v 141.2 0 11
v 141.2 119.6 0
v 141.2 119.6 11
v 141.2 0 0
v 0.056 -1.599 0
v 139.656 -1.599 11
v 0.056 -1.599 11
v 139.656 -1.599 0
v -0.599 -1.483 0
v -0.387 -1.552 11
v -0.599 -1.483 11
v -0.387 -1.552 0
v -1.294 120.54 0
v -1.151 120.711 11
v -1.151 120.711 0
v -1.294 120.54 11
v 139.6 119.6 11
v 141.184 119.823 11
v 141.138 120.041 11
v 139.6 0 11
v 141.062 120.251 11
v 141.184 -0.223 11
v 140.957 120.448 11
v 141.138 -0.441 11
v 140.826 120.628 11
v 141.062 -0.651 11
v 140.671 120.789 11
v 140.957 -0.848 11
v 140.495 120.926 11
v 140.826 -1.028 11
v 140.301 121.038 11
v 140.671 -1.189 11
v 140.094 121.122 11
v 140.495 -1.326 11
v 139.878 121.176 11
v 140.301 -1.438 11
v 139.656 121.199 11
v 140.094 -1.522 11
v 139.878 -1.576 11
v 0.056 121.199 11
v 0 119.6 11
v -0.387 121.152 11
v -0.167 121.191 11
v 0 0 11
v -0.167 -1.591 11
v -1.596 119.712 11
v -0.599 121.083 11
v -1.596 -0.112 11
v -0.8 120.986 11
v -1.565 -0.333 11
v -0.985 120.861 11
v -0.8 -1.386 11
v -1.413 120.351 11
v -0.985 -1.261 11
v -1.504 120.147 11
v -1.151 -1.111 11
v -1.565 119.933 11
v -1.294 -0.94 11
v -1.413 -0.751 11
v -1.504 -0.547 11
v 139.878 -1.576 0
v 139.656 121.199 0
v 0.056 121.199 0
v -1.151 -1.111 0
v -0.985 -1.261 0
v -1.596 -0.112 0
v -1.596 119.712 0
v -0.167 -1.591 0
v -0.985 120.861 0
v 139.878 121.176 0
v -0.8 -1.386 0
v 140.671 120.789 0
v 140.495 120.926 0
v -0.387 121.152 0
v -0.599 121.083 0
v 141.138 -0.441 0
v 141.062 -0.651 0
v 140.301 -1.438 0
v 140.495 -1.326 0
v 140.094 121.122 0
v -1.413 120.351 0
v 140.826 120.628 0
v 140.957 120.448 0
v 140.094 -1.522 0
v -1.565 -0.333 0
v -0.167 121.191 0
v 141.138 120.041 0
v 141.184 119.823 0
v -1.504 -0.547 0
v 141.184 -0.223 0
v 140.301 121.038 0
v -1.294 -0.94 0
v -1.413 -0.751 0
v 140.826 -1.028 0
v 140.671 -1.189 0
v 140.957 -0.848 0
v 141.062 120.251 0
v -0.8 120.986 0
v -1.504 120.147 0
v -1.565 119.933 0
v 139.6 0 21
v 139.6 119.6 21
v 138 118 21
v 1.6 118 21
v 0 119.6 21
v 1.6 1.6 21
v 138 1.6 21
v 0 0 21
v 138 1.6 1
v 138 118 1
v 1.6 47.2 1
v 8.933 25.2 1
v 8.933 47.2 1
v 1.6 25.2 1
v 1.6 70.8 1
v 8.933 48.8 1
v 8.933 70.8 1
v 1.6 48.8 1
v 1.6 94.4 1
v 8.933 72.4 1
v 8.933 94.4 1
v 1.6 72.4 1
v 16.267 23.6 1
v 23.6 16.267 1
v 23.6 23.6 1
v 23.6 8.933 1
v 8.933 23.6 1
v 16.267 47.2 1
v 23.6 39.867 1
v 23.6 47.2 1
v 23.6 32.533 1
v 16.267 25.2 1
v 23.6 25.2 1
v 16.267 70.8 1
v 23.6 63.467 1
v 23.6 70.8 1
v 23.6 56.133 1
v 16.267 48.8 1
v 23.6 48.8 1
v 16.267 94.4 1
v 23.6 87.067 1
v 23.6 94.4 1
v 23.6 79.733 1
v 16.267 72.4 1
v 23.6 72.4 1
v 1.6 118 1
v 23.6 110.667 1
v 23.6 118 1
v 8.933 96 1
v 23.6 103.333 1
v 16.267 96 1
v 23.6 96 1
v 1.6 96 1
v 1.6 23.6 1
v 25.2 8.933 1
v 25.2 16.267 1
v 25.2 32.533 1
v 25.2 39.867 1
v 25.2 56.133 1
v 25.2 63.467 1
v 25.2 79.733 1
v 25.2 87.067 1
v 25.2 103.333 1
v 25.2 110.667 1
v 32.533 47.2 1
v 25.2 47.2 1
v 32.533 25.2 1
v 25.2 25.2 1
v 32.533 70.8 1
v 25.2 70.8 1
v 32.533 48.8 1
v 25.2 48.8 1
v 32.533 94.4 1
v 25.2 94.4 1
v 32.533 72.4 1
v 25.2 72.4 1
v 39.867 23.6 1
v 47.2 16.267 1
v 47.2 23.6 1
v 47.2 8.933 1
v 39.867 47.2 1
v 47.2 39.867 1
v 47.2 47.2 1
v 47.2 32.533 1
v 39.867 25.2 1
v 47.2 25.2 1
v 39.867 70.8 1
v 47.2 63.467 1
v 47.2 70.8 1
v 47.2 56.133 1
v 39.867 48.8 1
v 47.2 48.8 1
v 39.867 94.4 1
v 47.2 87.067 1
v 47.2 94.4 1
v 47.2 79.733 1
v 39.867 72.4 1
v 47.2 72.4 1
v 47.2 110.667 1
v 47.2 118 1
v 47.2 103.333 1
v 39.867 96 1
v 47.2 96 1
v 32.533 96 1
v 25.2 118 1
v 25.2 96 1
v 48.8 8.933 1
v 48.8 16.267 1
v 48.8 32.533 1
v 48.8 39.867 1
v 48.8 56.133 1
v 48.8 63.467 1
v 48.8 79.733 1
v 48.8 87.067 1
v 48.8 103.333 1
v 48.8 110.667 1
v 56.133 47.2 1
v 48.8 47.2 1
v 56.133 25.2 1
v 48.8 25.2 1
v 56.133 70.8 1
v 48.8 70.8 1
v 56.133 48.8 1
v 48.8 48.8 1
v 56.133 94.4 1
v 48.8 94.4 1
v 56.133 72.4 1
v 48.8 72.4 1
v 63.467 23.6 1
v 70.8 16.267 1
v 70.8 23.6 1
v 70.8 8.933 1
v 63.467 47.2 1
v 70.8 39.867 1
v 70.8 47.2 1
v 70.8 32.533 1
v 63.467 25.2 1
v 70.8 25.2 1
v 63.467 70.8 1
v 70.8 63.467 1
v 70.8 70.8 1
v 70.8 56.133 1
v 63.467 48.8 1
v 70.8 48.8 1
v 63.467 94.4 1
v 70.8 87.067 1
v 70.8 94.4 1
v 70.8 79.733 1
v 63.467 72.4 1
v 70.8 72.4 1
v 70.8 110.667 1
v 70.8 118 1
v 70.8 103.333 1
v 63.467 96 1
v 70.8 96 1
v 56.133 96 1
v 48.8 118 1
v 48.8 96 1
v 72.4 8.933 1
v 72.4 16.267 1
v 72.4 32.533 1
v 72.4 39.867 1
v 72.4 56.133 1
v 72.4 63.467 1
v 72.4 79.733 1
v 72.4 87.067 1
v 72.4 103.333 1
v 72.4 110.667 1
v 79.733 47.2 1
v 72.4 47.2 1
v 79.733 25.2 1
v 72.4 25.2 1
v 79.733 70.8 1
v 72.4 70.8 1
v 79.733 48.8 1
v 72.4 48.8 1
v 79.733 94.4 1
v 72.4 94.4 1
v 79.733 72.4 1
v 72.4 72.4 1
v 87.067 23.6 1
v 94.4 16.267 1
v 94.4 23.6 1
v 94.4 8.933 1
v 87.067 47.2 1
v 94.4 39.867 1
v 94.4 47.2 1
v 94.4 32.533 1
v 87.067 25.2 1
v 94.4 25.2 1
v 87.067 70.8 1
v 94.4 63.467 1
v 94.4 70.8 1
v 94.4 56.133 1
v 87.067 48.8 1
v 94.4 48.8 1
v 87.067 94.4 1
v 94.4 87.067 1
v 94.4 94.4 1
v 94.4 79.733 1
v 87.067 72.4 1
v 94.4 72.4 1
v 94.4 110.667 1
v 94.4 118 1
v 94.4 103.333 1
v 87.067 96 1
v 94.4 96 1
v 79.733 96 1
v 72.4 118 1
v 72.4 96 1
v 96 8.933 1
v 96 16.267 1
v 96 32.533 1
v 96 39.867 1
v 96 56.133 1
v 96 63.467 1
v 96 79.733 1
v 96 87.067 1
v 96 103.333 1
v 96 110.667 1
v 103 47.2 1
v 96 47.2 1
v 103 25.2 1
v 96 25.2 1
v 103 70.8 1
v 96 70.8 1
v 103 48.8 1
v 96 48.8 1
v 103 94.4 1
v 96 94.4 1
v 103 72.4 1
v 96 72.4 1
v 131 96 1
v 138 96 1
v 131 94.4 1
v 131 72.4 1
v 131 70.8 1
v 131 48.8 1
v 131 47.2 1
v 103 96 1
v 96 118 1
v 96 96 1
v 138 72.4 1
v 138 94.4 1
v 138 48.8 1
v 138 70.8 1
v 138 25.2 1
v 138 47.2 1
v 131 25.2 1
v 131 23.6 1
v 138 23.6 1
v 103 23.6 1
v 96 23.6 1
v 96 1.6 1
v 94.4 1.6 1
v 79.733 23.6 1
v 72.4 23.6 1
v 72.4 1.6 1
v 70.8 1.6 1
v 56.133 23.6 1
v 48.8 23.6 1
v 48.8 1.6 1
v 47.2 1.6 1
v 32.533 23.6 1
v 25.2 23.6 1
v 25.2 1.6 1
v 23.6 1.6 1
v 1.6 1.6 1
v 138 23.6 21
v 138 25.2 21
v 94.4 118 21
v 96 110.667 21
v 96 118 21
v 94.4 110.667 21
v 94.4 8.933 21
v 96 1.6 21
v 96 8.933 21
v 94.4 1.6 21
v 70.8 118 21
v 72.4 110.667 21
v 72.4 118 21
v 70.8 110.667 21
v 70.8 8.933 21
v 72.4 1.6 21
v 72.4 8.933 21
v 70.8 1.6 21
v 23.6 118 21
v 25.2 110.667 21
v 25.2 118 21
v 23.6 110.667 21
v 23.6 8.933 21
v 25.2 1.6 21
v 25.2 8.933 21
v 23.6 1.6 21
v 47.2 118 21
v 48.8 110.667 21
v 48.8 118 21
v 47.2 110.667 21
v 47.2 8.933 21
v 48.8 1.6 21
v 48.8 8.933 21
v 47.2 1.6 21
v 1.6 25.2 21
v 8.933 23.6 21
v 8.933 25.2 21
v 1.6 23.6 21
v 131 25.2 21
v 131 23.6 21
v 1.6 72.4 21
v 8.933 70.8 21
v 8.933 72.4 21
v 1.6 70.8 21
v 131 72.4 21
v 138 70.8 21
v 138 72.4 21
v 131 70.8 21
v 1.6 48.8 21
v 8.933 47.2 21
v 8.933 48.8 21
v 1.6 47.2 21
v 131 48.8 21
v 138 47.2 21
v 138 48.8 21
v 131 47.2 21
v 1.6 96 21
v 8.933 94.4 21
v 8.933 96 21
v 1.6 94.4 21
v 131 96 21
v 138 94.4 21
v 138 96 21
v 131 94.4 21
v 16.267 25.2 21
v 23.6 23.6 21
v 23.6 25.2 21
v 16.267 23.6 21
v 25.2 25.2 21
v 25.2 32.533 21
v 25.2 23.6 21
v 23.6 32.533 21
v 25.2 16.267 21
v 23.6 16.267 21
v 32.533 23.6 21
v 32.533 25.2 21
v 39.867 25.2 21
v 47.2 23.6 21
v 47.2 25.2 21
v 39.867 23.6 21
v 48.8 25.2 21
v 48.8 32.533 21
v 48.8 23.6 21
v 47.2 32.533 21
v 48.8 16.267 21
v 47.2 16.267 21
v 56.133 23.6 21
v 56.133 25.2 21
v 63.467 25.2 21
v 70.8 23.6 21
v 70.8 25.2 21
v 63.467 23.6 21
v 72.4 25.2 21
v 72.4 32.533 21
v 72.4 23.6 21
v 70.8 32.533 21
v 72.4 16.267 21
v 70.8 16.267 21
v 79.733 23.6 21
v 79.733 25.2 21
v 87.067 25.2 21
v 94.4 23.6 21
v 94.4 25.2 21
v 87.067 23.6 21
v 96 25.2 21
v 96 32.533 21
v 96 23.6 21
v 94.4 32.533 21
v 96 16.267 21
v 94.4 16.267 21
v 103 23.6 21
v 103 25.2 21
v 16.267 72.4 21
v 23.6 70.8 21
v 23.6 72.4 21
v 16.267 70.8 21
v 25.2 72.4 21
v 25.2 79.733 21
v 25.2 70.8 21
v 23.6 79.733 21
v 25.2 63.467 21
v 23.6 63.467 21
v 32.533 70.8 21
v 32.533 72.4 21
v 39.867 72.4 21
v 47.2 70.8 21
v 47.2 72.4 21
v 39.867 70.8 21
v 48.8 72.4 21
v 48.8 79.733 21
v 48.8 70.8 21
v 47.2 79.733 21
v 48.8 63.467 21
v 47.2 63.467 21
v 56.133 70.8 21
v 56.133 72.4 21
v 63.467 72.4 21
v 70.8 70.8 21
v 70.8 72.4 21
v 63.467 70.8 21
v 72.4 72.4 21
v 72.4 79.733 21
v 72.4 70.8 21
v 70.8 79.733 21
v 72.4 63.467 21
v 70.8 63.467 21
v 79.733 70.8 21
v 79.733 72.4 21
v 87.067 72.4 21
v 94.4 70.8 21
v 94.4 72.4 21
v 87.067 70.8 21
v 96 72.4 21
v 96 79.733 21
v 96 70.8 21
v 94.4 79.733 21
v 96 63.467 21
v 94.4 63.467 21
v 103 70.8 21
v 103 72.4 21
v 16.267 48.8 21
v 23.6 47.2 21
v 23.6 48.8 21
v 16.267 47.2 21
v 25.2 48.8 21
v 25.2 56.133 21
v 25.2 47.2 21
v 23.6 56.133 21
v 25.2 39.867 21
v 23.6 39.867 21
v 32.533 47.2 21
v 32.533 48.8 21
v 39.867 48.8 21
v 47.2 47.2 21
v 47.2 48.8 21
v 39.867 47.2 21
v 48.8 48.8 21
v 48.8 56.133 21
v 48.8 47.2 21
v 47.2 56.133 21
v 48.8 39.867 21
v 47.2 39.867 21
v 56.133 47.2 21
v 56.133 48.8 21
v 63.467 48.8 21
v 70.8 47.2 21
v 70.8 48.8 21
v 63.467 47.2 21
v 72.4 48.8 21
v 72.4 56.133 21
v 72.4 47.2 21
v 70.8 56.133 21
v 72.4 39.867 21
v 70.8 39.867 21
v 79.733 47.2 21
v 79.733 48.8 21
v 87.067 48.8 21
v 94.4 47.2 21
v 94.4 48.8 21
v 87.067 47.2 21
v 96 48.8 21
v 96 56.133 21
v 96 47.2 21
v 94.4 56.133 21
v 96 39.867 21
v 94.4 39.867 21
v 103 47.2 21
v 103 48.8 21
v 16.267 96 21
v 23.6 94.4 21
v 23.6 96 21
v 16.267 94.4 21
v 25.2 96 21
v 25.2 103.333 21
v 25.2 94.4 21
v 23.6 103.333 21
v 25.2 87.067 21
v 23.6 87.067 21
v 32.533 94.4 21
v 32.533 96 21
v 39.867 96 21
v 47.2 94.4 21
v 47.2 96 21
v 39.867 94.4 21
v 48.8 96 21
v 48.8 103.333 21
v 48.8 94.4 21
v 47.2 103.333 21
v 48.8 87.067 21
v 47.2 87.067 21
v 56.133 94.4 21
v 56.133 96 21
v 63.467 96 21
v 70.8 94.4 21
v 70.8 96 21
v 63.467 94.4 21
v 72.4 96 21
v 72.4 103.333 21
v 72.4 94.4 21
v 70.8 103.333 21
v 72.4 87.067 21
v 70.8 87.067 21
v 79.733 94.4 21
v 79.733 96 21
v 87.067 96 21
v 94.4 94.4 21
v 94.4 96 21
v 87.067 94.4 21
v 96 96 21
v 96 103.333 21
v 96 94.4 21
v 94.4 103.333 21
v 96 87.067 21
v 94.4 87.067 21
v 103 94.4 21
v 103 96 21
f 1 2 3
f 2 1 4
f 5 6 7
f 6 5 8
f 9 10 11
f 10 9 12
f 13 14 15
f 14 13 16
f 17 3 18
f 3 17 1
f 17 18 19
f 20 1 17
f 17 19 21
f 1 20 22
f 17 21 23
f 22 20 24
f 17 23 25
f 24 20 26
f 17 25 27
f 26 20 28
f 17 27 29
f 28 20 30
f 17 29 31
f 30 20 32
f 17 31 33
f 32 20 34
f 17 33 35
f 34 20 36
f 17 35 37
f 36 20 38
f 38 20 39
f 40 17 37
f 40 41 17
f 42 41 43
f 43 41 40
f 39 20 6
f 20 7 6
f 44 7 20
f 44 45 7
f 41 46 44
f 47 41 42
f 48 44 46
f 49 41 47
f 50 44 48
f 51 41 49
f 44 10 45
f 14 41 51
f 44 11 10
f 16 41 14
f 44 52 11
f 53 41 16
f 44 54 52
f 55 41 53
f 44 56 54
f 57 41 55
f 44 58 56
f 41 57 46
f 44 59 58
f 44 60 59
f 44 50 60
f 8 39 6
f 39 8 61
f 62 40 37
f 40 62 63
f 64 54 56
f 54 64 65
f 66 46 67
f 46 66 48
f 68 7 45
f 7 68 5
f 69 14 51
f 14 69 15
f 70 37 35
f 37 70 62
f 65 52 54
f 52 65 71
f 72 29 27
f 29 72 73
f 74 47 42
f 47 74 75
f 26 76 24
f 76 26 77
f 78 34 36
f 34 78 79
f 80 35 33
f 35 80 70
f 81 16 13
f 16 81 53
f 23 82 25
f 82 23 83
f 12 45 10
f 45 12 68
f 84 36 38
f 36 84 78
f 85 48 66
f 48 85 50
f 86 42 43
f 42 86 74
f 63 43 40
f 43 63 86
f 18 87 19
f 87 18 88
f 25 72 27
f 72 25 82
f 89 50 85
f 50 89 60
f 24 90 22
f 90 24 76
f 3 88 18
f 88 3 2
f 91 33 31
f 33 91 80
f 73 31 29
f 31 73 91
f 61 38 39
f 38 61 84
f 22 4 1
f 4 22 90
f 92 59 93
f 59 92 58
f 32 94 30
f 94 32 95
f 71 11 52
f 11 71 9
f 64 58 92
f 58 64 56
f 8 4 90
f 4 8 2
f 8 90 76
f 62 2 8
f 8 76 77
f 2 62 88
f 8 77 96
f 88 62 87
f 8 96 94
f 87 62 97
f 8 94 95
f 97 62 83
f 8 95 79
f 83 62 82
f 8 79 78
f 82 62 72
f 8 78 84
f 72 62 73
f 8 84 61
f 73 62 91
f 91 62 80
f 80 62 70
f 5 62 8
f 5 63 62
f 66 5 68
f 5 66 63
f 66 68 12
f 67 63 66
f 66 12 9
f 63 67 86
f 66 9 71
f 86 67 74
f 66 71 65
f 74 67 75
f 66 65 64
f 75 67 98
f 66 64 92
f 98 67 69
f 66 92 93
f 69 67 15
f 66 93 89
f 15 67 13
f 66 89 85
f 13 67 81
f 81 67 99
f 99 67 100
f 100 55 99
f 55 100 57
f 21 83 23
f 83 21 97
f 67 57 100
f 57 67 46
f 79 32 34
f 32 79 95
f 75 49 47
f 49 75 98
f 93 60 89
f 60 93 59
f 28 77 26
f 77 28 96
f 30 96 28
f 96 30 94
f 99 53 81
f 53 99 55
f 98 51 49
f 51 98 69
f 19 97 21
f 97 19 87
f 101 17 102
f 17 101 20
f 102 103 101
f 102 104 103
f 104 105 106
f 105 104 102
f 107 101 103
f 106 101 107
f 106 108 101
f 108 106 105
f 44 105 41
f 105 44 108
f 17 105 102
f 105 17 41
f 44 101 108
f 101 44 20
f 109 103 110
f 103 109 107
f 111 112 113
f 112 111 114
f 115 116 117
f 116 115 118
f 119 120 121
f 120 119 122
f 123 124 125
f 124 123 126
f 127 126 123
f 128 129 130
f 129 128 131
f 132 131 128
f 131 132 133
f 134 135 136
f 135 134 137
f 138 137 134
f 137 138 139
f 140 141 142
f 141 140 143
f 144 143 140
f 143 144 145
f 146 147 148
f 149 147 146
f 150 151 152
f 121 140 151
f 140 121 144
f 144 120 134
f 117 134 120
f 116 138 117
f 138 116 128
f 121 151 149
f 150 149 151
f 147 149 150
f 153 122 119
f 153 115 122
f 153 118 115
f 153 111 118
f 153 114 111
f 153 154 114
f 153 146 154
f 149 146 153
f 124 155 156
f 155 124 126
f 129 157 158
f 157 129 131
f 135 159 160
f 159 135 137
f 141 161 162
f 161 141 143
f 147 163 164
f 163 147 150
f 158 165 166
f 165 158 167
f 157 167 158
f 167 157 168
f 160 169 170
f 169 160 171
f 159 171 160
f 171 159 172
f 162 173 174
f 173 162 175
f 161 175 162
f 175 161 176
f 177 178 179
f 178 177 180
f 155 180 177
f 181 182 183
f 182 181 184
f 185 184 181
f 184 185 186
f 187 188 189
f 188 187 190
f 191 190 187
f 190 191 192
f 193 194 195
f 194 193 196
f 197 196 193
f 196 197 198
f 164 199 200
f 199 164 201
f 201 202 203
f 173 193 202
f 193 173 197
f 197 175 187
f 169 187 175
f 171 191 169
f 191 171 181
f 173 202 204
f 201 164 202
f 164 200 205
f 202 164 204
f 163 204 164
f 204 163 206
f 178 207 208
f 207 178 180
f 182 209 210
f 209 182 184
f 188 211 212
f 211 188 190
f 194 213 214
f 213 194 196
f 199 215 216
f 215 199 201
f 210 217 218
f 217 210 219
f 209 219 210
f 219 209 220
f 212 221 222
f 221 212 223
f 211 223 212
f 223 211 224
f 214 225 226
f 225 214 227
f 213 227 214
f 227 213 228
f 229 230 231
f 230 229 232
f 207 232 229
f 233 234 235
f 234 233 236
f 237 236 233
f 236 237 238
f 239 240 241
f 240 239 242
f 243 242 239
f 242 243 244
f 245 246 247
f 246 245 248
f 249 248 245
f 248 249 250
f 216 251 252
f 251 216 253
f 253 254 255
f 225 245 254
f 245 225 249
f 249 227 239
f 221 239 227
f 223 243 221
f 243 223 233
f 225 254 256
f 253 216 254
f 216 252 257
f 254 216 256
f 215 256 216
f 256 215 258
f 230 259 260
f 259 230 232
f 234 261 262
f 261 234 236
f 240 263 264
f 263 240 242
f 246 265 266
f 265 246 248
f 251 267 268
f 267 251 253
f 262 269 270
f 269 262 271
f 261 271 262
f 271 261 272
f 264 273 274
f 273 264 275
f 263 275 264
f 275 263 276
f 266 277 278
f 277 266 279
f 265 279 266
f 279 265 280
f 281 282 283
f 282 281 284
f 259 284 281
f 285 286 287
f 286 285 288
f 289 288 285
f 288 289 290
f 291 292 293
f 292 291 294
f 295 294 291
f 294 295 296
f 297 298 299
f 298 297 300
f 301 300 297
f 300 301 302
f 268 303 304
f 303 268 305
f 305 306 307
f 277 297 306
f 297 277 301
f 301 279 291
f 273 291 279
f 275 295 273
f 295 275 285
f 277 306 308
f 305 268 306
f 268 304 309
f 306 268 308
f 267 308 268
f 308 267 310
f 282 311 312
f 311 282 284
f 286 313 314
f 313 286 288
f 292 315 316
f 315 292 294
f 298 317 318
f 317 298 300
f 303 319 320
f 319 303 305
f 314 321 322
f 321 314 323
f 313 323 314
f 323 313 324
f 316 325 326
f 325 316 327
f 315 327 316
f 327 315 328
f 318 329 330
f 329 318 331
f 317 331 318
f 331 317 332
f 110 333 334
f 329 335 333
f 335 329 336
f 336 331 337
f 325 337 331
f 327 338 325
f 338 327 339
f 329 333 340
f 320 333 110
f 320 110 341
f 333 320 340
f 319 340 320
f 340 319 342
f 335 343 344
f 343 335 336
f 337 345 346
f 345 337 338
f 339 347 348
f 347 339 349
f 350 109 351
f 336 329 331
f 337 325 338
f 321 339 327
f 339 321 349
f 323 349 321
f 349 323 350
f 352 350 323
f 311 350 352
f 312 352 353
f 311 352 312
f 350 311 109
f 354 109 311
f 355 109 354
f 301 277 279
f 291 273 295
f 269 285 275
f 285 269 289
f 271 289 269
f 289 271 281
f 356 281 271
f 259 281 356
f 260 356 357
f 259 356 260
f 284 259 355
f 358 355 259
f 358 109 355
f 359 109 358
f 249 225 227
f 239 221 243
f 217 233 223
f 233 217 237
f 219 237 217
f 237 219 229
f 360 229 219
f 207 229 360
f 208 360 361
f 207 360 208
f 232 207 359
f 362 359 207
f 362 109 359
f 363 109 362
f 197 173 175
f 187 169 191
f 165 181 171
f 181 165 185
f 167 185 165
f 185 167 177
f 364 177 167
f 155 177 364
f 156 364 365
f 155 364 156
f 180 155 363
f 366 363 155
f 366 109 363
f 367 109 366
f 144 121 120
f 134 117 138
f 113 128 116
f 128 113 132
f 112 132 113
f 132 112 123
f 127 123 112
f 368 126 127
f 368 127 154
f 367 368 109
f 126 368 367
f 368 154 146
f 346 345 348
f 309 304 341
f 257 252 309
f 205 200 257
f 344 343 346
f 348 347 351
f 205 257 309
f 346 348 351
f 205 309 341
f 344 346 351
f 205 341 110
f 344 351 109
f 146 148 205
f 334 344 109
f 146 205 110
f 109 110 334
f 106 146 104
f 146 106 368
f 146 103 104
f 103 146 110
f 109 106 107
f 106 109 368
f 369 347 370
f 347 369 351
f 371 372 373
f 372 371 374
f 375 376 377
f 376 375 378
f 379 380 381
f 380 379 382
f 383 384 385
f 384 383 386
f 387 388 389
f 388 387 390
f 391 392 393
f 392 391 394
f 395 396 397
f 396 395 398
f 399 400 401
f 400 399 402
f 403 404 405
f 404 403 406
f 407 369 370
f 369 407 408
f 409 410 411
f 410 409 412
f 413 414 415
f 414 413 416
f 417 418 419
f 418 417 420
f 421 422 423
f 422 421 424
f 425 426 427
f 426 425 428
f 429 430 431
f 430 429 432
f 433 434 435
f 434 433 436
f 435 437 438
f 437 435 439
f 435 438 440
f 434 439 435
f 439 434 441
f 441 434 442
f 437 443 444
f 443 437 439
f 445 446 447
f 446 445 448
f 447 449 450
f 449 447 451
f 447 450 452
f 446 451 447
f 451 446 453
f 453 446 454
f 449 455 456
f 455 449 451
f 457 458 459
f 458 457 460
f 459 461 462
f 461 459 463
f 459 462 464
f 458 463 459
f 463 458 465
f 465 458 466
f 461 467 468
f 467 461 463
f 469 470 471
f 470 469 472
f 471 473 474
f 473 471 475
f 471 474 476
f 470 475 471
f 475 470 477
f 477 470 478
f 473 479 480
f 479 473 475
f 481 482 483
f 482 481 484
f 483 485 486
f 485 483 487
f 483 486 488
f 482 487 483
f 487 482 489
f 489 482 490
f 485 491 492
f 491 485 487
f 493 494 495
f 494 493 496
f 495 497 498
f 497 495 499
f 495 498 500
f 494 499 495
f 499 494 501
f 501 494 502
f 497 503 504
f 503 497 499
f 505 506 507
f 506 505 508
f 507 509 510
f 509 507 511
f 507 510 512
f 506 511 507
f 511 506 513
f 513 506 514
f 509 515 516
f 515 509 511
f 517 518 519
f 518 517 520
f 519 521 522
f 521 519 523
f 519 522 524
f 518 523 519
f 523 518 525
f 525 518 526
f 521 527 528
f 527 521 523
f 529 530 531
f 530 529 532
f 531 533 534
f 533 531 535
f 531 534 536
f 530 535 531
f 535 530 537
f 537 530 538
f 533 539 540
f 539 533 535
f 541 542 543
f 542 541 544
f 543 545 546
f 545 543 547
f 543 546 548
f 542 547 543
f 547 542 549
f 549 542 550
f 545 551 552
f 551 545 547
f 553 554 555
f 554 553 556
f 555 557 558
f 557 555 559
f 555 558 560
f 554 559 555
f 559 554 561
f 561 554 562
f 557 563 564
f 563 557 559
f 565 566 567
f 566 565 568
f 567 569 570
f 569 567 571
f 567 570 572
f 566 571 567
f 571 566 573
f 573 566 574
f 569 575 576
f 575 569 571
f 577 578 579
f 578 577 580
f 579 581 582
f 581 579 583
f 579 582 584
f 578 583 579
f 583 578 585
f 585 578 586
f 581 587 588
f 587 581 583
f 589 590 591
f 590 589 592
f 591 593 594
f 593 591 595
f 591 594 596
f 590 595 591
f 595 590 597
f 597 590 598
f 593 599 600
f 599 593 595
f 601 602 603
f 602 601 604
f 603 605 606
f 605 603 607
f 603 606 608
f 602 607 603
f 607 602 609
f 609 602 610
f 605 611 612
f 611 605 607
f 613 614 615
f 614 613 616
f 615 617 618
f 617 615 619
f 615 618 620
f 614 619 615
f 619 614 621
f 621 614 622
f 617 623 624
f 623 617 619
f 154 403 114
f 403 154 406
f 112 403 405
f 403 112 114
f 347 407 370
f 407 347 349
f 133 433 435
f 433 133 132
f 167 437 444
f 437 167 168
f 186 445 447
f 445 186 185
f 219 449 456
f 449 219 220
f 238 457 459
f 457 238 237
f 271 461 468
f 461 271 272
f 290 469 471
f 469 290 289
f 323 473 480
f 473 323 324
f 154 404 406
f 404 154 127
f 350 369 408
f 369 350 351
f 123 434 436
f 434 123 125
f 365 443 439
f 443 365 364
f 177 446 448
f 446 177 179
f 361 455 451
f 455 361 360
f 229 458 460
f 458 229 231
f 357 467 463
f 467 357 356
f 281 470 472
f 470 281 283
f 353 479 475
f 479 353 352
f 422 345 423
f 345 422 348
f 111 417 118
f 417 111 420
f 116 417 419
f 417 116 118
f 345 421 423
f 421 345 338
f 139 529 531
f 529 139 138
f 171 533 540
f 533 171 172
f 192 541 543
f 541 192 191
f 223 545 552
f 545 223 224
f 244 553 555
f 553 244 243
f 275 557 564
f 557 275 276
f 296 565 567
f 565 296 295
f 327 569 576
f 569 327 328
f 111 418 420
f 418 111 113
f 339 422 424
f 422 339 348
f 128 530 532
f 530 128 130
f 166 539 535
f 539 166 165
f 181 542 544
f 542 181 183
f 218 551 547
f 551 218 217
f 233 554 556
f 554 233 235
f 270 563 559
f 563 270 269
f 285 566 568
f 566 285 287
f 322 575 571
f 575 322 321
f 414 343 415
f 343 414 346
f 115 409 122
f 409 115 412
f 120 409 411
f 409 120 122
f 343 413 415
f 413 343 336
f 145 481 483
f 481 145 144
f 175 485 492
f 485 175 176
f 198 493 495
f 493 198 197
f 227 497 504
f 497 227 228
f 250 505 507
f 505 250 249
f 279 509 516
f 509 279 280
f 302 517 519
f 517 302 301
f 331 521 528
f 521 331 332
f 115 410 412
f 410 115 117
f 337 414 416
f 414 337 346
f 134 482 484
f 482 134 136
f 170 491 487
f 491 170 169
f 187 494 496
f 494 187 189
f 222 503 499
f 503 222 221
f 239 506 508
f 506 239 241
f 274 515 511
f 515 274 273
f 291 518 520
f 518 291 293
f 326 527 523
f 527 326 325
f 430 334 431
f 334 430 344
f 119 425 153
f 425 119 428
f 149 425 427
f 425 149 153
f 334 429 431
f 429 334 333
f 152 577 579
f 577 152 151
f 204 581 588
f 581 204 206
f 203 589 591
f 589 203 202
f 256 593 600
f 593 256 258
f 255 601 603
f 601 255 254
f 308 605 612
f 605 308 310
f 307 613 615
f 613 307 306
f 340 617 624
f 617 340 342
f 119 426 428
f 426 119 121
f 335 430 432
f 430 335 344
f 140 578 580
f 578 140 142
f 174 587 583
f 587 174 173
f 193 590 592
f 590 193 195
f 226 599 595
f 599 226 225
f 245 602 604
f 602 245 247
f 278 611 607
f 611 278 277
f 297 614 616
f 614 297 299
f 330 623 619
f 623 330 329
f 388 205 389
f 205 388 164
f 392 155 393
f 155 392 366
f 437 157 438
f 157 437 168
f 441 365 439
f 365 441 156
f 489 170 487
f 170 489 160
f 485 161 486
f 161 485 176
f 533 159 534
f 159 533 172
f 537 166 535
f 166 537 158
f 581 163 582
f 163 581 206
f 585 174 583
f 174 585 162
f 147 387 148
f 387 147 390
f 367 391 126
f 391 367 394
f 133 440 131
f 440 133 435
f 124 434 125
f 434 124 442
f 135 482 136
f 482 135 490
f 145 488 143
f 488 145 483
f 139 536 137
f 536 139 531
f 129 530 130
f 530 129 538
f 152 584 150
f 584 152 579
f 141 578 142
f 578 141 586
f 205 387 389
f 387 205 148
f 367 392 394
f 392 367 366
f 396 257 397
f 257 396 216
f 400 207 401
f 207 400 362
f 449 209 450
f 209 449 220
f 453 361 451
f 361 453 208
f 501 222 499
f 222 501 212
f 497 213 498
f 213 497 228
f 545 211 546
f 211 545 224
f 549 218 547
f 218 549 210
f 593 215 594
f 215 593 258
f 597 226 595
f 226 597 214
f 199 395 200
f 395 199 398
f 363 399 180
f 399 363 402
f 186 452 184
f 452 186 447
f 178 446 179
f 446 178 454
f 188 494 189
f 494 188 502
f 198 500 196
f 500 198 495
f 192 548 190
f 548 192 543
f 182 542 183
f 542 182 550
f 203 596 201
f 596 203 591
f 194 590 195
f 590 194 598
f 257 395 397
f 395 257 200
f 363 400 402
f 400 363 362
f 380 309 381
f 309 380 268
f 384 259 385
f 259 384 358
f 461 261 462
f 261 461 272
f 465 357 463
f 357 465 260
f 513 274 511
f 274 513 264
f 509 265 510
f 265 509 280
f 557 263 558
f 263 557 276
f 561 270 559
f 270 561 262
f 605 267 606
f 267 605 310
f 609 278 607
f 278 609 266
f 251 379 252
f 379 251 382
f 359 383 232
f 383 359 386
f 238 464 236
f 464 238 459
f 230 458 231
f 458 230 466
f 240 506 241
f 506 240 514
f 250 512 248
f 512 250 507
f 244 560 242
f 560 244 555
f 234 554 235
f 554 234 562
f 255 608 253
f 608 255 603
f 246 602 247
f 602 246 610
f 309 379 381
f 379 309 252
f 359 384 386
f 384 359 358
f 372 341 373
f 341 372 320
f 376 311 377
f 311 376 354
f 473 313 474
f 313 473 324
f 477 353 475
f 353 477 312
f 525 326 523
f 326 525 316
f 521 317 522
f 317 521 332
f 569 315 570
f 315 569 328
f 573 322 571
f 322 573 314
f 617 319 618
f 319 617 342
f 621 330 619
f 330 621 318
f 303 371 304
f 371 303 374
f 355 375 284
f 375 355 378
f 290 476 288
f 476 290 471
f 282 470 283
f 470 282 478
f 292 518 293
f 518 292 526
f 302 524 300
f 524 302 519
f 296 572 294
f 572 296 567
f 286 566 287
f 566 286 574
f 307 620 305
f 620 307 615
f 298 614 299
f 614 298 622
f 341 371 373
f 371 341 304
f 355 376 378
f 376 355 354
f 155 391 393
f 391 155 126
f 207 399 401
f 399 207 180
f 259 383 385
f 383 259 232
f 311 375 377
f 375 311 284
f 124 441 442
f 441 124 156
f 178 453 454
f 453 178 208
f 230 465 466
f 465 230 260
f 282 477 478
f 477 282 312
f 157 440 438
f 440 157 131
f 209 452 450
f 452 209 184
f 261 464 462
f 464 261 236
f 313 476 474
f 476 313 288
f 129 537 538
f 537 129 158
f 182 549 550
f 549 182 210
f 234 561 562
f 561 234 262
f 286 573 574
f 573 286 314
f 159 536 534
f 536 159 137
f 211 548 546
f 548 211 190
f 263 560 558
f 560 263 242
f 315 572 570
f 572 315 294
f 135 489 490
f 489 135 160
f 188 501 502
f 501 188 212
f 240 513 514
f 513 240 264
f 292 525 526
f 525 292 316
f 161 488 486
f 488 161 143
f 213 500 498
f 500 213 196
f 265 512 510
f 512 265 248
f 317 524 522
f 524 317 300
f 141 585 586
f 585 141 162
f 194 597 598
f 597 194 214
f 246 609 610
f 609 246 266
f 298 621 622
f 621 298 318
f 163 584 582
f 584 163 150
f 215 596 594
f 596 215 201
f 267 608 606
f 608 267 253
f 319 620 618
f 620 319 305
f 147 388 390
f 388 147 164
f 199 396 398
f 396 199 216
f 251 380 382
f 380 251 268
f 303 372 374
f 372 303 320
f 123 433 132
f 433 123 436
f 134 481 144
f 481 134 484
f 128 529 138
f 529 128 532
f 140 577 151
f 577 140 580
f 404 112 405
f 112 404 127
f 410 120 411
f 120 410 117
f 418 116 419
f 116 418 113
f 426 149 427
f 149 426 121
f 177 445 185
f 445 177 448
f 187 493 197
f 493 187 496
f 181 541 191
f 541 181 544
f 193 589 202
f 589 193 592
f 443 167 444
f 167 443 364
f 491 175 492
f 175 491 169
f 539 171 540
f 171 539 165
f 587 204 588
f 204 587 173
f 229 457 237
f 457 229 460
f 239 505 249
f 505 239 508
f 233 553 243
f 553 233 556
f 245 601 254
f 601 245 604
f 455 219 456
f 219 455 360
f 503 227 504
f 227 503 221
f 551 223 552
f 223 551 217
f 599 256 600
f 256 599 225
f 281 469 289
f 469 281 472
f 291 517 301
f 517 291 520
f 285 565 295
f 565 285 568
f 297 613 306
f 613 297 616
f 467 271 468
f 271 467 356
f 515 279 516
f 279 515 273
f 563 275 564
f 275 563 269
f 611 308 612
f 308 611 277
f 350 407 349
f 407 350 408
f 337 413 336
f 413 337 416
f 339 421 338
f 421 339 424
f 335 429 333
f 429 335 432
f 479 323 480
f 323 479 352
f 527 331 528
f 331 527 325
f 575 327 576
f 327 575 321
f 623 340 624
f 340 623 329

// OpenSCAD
// Outpost 20th Anniversary Edition
//
// by W. Craig Trader is dual-licensed under 
// Creative Commons Attribution-ShareAlike 3.0 Unported License and
// GNU Lesser GPL 3.0 or later.

include <MCAD/units.scad>;

// Tile dimensions
TILE_THICKNESS = 2 * mm;
TILE_WIDTH = 20 * mm;
SMALL_TILE_HEIGHT = 20 * mm;
LARGE_TILE_HEIGHT = 40 * mm;
TILE_COUNT = max( 6, 9, 10 );

// Physical dimensions
WALL = 0.8 * mm;  // Slicing filament thickness
GAP  = 0.2 * mm;  // Size differential between box and lid, for snug fit
SPACING = 2 * mm; // Space around tiles to make them easier to insert / extract
LID = 1 * mm;
BOTTOM = 1 * mm;

// Wall dimensions
OUTER = 2 * WALL;
INNER = 2 * WALL;

// Command Line Arguments
PART = 1;           // Which part to output
VERBOSE = 1;        // Set to non-zero to see more data

OVERLAP = 0.1 * mm; // Ensures that there are no vertical artifacts leftover

$fn=45;

/*
 * Module / Function arguments:
 *
 * tiles    Number of tiles to stack vertically
 * rows     Number of rows of tiles
 * smalls   Number of small tiles per row
 * larges   Number of large tiles per row
 * extras   Size of extra storage bin (mm) per row
 * notches  True (default) to cut notches in the inside tile walls.
 */

tw = TILE_WIDTH + SPACING;
sth = SMALL_TILE_HEIGHT + SPACING;
lth = LARGE_TILE_HEIGHT + SPACING;
    
function inside_length( smalls, larges, extras ) = extras + smalls * sth + larges * lth + (sign(extras)+smalls-1+larges) * INNER;
function inside_depth( rows ) = rows * tw + (rows-1) * INNER;
function inside_height( tiles ) = tiles * TILE_THICKNESS;

module box_dividers(tiles, rows, smalls, larges, extras=40, notched=true) {
    row_x = inside_length( smalls, larges, extras );
    col_y = inside_depth( rows );
    div_z = inside_height( tiles );
    
    if (VERBOSE) {
        echo (InsideLength=row_x, InsideDepth=col_y, InsideHeight=div_z);
    }

    row_cuts   = [ [0,1*tw/3], [0,2*tw/3],  [div_z+OVERLAP,2*tw/3],  [div_z+OVERLAP,1*tw/3] ];
    small_cuts = [ [0,1*sth/3], [0,2*sth/3], [div_z+OVERLAP,2*sth/3], [div_z+OVERLAP,1*sth/3] ];
    large_cuts = [ [0,1*lth/6], [0,5*lth/6], [div_z+OVERLAP,5*lth/6], [div_z+OVERLAP,1*lth/6] ];

    difference() {
        union() {
            // Row walls
            for (row = [1:rows-1]) {
                dy = row * tw + (row-1) * INNER;
                translate( [0,dy,0] ) cube( [row_x, INNER, div_z ] );
            }
            
            // Extra compartments
            if (extras > 0) {
                dx = extras;
                translate( [dx,0,0] ) cube( [INNER, col_y, div_z] );
            }
            
            // Small column walls
            for (col = [1:smalls-1]) {
                dx = extras + sign(extras) * INNER + col * (tw + INNER) - INNER;
                translate( [dx,0,0] ) cube( [INNER, col_y, div_z] );
            }
            
            // Large column walls
            for (col = [0:larges-1]) {
                dx = extras + sign(extras) * INNER + smalls * (sth + INNER) + col * (lth + INNER) - INNER;
                translate( [dx,0,0] ) cube( [INNER, col_y, div_z] );
            }
        }
        
        if (notched) {
            // Row cutouts
            for (row = [1:rows]) {
                dx = extras + sign(extras) * INNER + GAP;
                dy = row * tw + (row-1) * (INNER) - tw;
                translate( [dx,dy,div_z+OVERLAP/2] ) 
                    rotate( [0,90,0] )
                        linear_extrude( height=row_x-extras-sign(extras)*INNER )
                            polygon( row_cuts );
                
            }
            
            // Small column cutouts
            for (col = [1:smalls]) {
                dx = extras + sign(extras) * INNER + col * (sth + INNER) - INNER;
                translate( [dx,0,div_z+OVERLAP/2] )
                    rotate( [0,90,90] )
                        linear_extrude( height=col_y )
                            polygon( small_cuts );
                            
            }
            
            // Large column cutouts
            for (col = [1:larges]) {
                dx = extras + sign(extras) * INNER + smalls * (sth + INNER) + col * (lth + INNER) - INNER;
                translate( [dx,0,div_z+OVERLAP/2] )
                    rotate( [0,90,90] )
                        linear_extrude( height=col_y )
                            polygon( large_cuts );
                            
            }
        }
    }
}

module box_bottom(tiles, rows, smalls, larges, extras=40, notches=true) {
    row_x = inside_length( smalls, larges, extras );
    col_y = inside_depth( rows );
    div_z = inside_height( tiles );
    
    box_x = row_x + 2 * INNER;
    box_y = col_y + 2 * INNER;
    box_z = div_z - ceil( div_z / 2 );
    
    lip_x = row_x + 2 * INNER;
    lip_y = col_y + 2 * INNER;
    lip_z = div_z;
    
    echo (BoxLength=box_x, BoxDepth=box_y, BoxHeight=box_z);
    
    union() {
        difference() {
            union() {
                minkowski() {
                    cube( [ box_x, box_y, box_z ] );
                    cylinder( r=OUTER, h=1 );
                }
                translate( [ 0, 0, BOTTOM ] )
                    cube( [ lip_x, lip_y, lip_z ] );
                
            }
            
            // Remove inside of box
            translate( [ INNER, INNER, BOTTOM ] )
                cube( [ row_x, col_y, div_z+1 ] );
        }
        
        translate( [ INNER, INNER, BOTTOM ] )
            box_dividers( tiles, rows, smalls, larges, extras, notches );
    }
}

module box_lid(tiles, rows, smalls, larges, extras=40) {
    row_x = inside_length( smalls, larges, extras );
    col_y = inside_depth( rows );
    div_z = inside_height( tiles );
    
    lid_x = row_x + 2 * INNER;
    lid_y = col_y + 2 * INNER;
    lid_z = ceil( div_z / 2 );
    
    lid_r = 10 * mm;
    
    echo (LidLength=lid_x, LidDepth=lid_y, LidHeight=lid_z);

    difference() {
        // Outside of lid
        minkowski() {
            cube( [ lid_x, lid_y, lid_z ] );
            cylinder( r=OUTER, h=LID );
        }
        
        // Remove inside of lid
        translate( [ 0, 0, LID ] )
            cube( [ lid_x, lid_y, lid_z+1 ] );
        
        // Remove notches to make it easier to remove the lid
        translate( [-2*OUTER,lid_y/2+OUTER/2,lid_r-0+lid_z-2*OUTER] ) 
            rotate( [0,90,0] )
                cylinder( r=lid_r, h=lid_x+4*OUTER );
    }
    
}

// ----- Choose which part to output ------------------------------------------

if (PART == 1) {
    box_bottom( TILE_COUNT, 5, 4, 1, 0 );
} else if (PART == 2) {
    box_lid( TILE_COUNT, 5, 4, 1, 0 );
}
